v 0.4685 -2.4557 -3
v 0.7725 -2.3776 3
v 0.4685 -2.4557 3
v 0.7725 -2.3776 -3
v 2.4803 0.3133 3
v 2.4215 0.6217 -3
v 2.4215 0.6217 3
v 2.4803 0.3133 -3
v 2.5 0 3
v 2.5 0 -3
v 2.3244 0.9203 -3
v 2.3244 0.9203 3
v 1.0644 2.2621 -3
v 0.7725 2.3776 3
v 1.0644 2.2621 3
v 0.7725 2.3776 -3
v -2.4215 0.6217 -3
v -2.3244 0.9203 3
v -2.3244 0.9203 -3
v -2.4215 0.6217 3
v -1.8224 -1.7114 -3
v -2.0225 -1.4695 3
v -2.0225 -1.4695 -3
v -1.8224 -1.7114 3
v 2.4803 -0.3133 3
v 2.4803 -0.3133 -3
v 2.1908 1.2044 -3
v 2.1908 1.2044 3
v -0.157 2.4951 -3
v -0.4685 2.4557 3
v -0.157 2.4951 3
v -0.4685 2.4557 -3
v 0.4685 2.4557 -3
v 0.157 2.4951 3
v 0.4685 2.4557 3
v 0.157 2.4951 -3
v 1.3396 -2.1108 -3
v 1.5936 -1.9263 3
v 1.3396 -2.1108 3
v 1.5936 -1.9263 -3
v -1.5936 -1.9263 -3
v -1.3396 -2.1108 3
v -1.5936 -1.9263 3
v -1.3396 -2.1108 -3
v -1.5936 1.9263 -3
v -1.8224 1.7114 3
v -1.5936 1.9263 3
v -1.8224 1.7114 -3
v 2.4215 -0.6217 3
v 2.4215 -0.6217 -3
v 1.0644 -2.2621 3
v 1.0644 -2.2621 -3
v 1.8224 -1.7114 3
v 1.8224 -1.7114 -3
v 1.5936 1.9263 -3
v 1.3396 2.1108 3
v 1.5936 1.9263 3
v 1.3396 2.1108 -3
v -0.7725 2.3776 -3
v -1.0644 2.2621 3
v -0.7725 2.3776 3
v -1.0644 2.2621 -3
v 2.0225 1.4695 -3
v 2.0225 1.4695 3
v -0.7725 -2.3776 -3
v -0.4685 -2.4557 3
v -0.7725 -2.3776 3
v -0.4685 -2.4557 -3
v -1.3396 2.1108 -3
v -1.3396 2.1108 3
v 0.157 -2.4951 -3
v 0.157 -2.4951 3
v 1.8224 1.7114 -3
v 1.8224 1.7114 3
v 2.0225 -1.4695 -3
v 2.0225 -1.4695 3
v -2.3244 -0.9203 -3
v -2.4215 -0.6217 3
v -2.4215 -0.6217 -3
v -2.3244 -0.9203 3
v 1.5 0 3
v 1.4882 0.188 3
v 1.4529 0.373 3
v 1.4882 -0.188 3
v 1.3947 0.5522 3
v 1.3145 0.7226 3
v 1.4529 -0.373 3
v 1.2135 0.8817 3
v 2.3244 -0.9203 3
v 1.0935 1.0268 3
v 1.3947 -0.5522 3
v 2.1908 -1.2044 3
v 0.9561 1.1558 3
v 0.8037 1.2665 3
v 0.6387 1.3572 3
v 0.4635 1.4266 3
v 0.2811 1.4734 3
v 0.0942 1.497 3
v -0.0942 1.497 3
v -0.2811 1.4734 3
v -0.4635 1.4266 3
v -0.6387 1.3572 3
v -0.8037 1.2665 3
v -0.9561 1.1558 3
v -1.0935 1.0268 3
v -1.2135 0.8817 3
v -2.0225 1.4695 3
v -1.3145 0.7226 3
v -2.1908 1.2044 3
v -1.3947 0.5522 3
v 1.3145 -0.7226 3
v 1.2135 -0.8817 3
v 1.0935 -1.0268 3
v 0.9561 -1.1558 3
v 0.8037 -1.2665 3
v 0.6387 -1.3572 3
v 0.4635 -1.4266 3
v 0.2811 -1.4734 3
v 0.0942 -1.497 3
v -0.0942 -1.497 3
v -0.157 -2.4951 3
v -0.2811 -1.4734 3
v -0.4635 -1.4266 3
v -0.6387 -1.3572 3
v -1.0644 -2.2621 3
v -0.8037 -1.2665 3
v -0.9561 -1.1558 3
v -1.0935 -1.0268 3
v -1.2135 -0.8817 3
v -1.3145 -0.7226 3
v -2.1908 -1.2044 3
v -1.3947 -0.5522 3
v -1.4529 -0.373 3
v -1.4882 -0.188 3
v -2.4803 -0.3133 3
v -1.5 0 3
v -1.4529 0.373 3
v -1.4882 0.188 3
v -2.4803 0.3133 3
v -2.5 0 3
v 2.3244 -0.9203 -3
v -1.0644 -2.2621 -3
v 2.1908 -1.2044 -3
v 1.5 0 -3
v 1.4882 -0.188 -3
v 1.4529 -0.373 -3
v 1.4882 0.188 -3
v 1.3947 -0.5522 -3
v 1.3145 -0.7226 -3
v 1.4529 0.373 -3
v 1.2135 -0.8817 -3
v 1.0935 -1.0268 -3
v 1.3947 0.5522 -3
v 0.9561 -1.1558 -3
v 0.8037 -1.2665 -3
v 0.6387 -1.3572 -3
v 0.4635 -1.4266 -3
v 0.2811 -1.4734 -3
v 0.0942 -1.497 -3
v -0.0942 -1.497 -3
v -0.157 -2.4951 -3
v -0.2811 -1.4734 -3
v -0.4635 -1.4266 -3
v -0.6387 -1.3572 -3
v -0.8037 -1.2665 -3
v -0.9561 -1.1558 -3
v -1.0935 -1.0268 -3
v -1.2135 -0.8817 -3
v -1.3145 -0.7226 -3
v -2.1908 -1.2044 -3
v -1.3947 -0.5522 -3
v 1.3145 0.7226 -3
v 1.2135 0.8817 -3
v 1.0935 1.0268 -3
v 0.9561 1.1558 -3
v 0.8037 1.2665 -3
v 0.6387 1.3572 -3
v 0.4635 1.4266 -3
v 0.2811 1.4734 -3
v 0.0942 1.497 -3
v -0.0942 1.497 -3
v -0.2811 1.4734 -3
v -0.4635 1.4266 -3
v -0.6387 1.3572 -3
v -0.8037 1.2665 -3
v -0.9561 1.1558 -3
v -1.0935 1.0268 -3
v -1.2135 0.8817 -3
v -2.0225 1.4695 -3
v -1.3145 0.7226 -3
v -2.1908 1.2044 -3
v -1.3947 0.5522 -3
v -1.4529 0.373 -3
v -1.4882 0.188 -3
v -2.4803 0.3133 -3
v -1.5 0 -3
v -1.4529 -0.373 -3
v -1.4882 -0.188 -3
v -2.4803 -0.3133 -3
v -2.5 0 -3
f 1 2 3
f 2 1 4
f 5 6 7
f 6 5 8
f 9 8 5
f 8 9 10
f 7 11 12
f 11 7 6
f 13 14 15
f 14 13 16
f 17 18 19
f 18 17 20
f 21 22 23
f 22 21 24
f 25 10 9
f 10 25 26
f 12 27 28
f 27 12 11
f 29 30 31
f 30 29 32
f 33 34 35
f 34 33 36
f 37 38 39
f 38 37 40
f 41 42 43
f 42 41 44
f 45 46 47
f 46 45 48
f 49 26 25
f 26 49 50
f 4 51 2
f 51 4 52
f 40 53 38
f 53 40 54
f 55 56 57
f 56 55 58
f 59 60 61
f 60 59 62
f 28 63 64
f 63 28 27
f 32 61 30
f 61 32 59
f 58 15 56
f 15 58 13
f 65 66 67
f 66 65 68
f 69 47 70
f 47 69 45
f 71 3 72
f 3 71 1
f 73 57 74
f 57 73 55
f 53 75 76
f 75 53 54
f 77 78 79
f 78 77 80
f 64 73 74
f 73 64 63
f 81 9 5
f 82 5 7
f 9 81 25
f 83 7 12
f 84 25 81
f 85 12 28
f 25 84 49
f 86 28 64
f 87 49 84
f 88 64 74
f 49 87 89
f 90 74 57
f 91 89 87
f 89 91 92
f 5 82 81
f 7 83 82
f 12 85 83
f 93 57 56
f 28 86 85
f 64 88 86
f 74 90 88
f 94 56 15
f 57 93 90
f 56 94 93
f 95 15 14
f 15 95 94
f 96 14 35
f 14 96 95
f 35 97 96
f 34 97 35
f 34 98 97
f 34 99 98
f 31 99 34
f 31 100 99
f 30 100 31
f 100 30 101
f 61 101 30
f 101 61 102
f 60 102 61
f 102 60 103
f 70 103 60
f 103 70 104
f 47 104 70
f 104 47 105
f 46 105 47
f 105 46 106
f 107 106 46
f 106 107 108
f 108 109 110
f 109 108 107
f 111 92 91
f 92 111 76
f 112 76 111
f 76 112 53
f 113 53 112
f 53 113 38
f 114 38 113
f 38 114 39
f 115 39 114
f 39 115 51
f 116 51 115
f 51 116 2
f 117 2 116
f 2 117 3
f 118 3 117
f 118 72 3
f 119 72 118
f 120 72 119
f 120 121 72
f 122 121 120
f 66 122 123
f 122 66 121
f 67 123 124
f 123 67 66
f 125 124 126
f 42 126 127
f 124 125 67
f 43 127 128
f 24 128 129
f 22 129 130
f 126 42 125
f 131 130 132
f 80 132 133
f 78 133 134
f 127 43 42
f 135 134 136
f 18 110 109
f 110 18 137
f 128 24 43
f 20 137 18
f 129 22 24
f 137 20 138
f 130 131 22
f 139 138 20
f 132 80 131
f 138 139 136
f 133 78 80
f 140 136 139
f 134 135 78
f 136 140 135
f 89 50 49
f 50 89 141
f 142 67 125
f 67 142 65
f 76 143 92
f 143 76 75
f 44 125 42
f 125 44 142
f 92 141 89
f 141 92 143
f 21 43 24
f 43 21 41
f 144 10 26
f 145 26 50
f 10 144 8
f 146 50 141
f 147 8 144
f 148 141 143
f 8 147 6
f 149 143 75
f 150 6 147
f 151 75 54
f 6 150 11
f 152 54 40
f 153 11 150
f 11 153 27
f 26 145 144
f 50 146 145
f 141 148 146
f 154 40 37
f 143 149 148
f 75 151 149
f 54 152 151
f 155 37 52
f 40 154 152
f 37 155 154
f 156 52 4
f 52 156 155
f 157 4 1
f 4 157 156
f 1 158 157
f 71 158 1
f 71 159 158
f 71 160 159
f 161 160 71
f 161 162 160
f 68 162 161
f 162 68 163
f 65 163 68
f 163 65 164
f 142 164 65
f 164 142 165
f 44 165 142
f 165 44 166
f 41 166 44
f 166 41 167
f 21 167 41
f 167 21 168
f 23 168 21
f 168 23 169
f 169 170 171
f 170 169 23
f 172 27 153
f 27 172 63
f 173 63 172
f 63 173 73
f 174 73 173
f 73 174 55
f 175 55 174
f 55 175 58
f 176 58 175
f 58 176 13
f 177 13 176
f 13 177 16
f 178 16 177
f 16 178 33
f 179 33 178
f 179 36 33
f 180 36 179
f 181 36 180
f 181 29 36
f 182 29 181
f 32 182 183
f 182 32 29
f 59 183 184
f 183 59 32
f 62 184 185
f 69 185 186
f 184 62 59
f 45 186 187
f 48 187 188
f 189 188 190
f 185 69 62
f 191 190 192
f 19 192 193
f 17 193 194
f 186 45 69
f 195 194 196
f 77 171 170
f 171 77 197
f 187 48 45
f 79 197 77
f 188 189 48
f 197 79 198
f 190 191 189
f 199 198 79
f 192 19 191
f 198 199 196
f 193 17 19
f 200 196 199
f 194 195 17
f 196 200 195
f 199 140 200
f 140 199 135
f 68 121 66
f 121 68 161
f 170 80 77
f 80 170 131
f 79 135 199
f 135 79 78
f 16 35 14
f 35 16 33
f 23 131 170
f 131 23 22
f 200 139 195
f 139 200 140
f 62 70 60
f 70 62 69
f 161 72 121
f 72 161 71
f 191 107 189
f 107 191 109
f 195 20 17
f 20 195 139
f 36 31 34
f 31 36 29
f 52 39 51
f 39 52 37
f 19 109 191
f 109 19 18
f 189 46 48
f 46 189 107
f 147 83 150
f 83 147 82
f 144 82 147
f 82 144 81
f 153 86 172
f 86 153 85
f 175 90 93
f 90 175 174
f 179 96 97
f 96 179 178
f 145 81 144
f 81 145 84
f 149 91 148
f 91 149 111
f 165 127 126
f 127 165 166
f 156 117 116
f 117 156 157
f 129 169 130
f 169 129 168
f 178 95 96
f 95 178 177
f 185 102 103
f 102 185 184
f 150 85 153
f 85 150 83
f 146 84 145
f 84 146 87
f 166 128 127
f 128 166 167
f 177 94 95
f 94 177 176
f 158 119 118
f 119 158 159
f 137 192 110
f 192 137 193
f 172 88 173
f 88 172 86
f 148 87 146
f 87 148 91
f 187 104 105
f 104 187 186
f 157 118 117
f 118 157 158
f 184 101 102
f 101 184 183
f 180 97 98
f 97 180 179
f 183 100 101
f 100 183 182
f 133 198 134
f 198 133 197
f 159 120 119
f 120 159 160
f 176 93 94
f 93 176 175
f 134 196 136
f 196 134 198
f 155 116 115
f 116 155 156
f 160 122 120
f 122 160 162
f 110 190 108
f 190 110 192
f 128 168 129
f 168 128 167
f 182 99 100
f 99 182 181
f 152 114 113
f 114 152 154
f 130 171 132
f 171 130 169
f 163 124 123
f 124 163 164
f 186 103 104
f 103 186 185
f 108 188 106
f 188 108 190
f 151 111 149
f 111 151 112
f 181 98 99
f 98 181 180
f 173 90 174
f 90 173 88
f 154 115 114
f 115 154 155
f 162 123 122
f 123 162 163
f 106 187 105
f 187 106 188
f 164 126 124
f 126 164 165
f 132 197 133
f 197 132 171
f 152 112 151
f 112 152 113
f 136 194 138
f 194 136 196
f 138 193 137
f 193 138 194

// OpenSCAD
$fn = 50;


difference() {
	union() {
		translate(v = [0, 0, -3.0000000000]) {
			cylinder(h = 6, r = 2.5000000000);
		}
	}
	union() {
		translate(v = [0, 0, -100.0000000000]) {
			cylinder(h = 200, r = 1.5000000000);
		}
	}
}
